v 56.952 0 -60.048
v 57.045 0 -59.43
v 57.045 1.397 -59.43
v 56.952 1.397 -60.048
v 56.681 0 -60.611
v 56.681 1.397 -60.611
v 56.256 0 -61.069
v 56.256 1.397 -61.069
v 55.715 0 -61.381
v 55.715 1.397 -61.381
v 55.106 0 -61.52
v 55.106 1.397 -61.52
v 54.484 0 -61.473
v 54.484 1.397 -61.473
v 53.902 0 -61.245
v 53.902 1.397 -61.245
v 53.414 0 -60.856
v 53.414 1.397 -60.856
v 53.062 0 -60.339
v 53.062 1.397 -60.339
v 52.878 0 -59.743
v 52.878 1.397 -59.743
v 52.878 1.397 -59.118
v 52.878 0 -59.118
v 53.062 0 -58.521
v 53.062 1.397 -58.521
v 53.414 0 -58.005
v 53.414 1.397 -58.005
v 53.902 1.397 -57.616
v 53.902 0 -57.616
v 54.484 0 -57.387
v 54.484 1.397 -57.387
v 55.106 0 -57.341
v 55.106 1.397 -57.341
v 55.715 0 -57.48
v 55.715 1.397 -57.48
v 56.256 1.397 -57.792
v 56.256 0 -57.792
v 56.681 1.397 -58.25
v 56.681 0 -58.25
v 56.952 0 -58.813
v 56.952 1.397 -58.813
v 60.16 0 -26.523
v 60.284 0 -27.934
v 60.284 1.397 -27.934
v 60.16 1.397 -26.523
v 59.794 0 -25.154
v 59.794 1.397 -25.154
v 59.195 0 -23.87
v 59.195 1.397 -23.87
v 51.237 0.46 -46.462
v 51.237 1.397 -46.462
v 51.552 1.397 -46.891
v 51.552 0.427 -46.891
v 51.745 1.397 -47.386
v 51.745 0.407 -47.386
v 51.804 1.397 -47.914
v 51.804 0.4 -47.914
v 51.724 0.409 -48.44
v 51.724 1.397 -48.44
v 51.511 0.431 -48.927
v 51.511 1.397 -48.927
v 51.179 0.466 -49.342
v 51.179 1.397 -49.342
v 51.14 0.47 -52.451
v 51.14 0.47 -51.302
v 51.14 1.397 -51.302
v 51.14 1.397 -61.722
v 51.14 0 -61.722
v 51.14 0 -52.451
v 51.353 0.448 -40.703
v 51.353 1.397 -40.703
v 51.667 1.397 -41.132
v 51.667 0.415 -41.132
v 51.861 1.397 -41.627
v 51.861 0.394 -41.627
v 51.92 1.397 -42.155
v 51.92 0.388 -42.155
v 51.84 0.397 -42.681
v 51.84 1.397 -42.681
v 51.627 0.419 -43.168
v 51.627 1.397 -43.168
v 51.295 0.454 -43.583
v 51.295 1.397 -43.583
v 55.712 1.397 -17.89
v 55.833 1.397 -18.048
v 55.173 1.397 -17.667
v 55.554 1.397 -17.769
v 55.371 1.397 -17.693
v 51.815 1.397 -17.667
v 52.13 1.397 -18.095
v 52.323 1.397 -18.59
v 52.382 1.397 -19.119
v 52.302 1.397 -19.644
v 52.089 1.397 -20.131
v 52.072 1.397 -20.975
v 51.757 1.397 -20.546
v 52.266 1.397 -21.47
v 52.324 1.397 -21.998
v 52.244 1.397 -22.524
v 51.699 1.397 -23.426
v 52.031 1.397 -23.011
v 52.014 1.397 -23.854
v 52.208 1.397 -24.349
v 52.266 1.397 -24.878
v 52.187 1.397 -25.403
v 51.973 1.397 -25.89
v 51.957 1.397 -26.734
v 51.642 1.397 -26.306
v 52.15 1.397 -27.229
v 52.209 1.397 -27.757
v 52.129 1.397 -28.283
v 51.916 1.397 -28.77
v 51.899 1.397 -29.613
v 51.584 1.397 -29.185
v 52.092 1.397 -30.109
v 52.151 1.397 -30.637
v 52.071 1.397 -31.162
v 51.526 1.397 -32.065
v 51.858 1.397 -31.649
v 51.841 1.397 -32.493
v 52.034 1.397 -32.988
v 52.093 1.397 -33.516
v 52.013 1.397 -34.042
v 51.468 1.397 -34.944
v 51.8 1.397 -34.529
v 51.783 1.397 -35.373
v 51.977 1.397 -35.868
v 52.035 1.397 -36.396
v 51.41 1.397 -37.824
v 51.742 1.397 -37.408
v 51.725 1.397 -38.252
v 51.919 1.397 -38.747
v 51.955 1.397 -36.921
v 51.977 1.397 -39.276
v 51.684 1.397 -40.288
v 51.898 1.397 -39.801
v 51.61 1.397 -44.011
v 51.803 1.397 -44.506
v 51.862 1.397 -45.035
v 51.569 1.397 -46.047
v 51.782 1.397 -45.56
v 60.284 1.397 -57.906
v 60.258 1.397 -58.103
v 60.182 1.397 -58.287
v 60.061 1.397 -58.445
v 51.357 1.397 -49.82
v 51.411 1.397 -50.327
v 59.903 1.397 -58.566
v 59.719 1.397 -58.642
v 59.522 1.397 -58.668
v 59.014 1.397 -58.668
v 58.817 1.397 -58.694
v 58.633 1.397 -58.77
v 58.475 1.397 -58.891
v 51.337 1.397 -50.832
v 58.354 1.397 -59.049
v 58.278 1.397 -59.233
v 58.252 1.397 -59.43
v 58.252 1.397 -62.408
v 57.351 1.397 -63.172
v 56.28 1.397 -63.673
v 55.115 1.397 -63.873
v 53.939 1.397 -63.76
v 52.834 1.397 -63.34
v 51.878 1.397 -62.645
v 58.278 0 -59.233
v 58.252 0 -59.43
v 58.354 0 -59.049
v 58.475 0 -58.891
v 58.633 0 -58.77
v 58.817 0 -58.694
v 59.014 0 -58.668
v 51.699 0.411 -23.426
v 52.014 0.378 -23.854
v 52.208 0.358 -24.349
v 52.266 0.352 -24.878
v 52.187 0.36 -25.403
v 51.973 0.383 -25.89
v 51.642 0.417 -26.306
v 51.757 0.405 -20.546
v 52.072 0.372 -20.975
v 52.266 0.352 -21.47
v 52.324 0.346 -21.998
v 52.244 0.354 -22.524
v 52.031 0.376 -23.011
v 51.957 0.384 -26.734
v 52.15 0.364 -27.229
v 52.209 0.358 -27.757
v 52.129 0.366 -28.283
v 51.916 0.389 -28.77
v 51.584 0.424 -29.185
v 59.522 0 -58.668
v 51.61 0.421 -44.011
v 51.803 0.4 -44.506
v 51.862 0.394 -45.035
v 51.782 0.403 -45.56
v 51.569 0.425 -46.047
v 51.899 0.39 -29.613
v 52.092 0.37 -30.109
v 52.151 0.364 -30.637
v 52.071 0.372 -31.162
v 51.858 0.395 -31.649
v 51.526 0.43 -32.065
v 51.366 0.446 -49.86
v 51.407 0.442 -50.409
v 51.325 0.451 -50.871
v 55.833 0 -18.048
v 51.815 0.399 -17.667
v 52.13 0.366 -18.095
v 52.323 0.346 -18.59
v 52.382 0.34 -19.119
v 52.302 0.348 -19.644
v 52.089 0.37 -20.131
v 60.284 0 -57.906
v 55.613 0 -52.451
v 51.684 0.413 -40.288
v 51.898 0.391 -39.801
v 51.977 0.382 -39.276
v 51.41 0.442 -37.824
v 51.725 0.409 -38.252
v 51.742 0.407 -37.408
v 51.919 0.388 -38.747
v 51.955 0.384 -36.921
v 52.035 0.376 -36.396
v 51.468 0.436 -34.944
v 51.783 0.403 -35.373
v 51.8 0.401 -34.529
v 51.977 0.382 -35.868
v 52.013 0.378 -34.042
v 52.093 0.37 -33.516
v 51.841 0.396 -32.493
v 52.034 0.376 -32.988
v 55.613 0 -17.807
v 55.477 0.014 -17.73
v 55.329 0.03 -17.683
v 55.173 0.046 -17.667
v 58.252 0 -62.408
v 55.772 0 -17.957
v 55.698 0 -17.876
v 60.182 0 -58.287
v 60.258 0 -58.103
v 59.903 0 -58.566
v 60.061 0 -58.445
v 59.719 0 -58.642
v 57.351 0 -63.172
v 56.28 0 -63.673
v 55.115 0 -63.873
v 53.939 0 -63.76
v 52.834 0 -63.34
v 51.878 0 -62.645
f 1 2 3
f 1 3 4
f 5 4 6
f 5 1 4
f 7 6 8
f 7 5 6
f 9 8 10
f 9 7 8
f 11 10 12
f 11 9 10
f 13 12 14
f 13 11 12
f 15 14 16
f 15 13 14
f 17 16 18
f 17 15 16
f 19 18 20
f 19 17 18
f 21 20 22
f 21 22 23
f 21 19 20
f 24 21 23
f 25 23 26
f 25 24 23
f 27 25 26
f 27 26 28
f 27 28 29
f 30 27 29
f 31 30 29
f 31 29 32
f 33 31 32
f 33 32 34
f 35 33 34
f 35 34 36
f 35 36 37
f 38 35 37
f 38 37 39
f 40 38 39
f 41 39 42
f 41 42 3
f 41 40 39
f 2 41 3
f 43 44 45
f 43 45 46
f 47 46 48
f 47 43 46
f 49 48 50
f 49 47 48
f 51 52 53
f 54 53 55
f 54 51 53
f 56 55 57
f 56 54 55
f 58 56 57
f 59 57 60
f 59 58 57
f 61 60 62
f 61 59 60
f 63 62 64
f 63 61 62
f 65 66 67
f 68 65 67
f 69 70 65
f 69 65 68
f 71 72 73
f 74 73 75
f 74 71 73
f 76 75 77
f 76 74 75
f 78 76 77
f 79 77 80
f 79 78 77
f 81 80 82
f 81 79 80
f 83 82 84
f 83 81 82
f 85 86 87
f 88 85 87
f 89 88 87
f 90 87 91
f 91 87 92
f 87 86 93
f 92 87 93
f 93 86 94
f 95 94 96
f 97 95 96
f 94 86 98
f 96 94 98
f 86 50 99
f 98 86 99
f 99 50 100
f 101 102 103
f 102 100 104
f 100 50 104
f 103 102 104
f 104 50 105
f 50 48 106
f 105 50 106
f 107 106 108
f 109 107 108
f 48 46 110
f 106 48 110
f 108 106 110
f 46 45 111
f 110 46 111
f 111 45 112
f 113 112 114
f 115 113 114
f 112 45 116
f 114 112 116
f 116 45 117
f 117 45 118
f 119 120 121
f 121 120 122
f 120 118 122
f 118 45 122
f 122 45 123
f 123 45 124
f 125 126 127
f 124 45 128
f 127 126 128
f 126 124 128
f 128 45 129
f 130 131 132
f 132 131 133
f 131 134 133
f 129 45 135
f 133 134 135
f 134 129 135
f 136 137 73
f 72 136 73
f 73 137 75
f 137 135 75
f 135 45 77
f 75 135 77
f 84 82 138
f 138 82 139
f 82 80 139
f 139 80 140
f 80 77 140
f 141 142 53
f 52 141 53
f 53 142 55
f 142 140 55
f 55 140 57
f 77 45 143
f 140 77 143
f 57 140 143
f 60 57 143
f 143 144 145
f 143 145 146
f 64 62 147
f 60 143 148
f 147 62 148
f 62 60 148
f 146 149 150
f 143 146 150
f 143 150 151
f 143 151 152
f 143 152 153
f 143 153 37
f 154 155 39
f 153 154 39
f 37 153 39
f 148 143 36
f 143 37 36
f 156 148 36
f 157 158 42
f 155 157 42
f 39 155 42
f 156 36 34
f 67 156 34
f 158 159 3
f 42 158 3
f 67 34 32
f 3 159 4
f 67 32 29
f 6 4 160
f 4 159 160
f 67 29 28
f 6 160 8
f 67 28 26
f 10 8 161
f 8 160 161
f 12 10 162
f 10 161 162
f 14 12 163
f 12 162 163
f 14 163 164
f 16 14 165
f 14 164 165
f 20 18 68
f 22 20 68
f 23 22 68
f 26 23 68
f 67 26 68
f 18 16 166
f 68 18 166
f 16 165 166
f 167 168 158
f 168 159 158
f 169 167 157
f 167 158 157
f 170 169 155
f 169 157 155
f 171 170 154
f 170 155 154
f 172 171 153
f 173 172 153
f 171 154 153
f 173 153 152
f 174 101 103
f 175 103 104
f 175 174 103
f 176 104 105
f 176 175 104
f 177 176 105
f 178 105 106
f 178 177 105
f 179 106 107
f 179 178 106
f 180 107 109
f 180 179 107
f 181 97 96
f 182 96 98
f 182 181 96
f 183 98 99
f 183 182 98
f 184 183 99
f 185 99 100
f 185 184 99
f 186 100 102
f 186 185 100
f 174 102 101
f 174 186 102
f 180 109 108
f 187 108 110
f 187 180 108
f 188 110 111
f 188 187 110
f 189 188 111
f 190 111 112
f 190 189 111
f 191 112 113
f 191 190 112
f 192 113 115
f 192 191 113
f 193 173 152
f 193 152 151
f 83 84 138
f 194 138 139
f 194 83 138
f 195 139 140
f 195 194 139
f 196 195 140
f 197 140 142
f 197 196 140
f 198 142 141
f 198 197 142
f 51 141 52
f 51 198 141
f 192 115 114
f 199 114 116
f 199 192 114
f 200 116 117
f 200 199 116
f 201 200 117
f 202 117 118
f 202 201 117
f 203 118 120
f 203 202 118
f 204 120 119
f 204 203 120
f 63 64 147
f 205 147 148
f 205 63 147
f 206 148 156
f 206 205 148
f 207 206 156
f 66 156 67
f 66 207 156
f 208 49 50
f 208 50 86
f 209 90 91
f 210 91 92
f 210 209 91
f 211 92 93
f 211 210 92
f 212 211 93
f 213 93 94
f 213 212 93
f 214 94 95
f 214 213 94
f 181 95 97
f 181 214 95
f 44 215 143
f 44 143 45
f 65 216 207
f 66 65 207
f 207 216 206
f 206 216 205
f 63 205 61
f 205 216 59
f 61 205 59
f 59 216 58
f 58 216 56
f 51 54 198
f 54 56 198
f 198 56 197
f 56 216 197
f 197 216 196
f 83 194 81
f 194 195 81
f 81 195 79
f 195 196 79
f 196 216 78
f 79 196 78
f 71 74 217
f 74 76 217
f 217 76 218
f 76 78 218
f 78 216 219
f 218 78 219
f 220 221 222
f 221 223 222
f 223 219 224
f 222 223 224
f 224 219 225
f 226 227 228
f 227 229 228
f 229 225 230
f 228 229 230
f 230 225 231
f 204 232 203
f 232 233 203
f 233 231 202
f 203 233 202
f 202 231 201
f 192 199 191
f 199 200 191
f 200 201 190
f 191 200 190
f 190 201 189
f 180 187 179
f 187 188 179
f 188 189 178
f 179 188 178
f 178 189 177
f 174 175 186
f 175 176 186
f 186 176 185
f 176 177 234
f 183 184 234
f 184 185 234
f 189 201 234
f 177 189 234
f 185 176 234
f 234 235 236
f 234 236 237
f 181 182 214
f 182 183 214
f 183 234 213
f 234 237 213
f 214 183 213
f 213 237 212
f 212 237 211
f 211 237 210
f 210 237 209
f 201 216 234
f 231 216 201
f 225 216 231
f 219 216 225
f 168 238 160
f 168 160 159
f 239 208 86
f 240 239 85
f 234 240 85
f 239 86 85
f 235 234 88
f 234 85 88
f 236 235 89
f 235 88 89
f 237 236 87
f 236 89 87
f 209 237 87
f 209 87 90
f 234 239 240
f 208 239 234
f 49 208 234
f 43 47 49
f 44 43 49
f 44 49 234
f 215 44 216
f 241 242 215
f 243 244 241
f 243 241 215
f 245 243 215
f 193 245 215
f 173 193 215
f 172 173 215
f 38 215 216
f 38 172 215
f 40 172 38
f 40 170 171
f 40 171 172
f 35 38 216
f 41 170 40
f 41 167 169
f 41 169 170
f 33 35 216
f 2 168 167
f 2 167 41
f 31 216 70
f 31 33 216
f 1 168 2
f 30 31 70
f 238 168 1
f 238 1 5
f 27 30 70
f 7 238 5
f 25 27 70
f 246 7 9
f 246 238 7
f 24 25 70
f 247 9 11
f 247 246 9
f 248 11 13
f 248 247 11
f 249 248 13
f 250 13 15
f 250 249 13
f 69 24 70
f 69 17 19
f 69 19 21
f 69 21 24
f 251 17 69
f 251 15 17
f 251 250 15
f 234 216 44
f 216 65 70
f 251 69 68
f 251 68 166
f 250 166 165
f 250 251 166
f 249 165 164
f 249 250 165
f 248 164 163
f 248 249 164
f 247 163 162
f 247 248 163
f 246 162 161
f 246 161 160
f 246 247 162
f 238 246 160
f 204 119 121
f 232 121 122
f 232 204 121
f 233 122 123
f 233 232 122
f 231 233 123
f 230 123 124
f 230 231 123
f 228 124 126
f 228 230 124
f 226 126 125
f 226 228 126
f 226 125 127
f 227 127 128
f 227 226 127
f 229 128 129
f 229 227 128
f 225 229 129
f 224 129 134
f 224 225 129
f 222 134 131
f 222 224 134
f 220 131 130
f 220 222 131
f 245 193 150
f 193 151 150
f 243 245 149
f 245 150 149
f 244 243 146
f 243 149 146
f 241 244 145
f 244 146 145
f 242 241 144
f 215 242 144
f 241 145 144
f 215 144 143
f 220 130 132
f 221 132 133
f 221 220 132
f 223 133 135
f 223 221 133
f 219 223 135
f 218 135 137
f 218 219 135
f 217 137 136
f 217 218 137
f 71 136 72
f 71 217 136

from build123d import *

# Parameters (mm, degrees)
SKETCH1_R           = 2.0955
BOSS_EXTRUDE1_DEPTH = 1.397
CUT_EXTRUDE1_DEPTH  = 52.451
FILLET1_R           = 0.762


with BuildPart() as part:
    # Sketch1 → Boss-Extrude1 (new body)
    with BuildSketch(Plane(origin=(0, 0, 0), x_dir=(1, 0, 0), z_dir=(0, 1, 0))):
        with BuildLine():
            Line((58.251832272, 62.407600024), (58.251832272, 58.66827713))
            Line((58.251832272, 58.66827713), (60.283832272, 58.66827713))
            Line((60.283832272, 58.66827713), (60.283832272, 27.93427713))
            ThreePointArc((60.283832272, 27.93427713), (60.006877388, 25.830595931), (59.194886754, 23.87027713))
            Line((59.194886754, 23.87027713), (55.613371084, 17.666910021))
            Line((55.613371084, 17.666910021), (51.815116638, 17.666910021))
            ThreePointArc((51.815116638, 17.666910021), (52.382112404, 19.118650157), (51.757304959, 20.546462917))
            ThreePointArc((51.757304959, 20.546462917), (52.324300725, 21.998203054), (51.69949328, 23.426015814))
            ThreePointArc((51.69949328, 23.426015814), (52.266489046, 24.87775595), (51.641681601, 26.305568711))
            ThreePointArc((51.641681601, 26.305568711), (52.208677367, 27.757308847), (51.583869921, 29.185121607))
            ThreePointArc((51.583869921, 29.185121607), (52.150865688, 30.636861744), (51.526058242, 32.064674504))
            ThreePointArc((51.526058242, 32.064674504), (52.093054008, 33.51641464), (51.468246563, 34.944227401))
            ThreePointArc((51.468246563, 34.944227401), (52.035242329, 36.395967537), (51.410434884, 37.823780298))
            ThreePointArc((51.410434884, 37.823780298), (51.97743065, 39.275520434), (51.352623205, 40.703333194))
            ThreePointArc((51.352623205, 40.703333194), (51.919618971, 42.155073331), (51.294811526, 43.582886091))
            ThreePointArc((51.294811526, 43.582886091), (51.861807292, 45.034626227), (51.236999847, 46.462438988))
            ThreePointArc((51.236999847, 46.462438988), (51.803995613, 47.914179124), (51.179188167, 49.341991884))
            ThreePointArc((51.179188167, 49.341991884), (51.410778499, 50.327179124), (51.139832272, 51.30227713))
            Line((51.139832272, 51.30227713), (51.139832272, 61.721904416))
            ThreePointArc((51.139832272, 61.721904416), (54.523146654, 63.855838676), (58.251832272, 62.407600024))
        make_face()
        with Locations((54.949832272, 59.43027713)):
            Circle(SKETCH1_R, mode=Mode.SUBTRACT)
    extrude(amount=BOSS_EXTRUDE1_DEPTH)

    # Sketch2 → Cut-Extrude1 (cut)
    with BuildSketch(Plane.XY):
        Polygon((55.613371084, 0), (51.139832272, 0.470187876), (51.139832272, 0), align=None)
    extrude(amount=-CUT_EXTRUDE1_DEPTH, mode=Mode.SUBTRACT)

    # Fillet1
    fillet1_edges = [part.edges().sort_by_distance(p)[0] for p in [
        (58.251832272, 0.6985, -58.66827713),
        (60.283832272, 0.6985, -58.66827713),
        (55.613371084, 0.6985, -17.666910021),
    ]]
    fillet(fillet1_edges, radius=FILLET1_R)


solid = part.part
